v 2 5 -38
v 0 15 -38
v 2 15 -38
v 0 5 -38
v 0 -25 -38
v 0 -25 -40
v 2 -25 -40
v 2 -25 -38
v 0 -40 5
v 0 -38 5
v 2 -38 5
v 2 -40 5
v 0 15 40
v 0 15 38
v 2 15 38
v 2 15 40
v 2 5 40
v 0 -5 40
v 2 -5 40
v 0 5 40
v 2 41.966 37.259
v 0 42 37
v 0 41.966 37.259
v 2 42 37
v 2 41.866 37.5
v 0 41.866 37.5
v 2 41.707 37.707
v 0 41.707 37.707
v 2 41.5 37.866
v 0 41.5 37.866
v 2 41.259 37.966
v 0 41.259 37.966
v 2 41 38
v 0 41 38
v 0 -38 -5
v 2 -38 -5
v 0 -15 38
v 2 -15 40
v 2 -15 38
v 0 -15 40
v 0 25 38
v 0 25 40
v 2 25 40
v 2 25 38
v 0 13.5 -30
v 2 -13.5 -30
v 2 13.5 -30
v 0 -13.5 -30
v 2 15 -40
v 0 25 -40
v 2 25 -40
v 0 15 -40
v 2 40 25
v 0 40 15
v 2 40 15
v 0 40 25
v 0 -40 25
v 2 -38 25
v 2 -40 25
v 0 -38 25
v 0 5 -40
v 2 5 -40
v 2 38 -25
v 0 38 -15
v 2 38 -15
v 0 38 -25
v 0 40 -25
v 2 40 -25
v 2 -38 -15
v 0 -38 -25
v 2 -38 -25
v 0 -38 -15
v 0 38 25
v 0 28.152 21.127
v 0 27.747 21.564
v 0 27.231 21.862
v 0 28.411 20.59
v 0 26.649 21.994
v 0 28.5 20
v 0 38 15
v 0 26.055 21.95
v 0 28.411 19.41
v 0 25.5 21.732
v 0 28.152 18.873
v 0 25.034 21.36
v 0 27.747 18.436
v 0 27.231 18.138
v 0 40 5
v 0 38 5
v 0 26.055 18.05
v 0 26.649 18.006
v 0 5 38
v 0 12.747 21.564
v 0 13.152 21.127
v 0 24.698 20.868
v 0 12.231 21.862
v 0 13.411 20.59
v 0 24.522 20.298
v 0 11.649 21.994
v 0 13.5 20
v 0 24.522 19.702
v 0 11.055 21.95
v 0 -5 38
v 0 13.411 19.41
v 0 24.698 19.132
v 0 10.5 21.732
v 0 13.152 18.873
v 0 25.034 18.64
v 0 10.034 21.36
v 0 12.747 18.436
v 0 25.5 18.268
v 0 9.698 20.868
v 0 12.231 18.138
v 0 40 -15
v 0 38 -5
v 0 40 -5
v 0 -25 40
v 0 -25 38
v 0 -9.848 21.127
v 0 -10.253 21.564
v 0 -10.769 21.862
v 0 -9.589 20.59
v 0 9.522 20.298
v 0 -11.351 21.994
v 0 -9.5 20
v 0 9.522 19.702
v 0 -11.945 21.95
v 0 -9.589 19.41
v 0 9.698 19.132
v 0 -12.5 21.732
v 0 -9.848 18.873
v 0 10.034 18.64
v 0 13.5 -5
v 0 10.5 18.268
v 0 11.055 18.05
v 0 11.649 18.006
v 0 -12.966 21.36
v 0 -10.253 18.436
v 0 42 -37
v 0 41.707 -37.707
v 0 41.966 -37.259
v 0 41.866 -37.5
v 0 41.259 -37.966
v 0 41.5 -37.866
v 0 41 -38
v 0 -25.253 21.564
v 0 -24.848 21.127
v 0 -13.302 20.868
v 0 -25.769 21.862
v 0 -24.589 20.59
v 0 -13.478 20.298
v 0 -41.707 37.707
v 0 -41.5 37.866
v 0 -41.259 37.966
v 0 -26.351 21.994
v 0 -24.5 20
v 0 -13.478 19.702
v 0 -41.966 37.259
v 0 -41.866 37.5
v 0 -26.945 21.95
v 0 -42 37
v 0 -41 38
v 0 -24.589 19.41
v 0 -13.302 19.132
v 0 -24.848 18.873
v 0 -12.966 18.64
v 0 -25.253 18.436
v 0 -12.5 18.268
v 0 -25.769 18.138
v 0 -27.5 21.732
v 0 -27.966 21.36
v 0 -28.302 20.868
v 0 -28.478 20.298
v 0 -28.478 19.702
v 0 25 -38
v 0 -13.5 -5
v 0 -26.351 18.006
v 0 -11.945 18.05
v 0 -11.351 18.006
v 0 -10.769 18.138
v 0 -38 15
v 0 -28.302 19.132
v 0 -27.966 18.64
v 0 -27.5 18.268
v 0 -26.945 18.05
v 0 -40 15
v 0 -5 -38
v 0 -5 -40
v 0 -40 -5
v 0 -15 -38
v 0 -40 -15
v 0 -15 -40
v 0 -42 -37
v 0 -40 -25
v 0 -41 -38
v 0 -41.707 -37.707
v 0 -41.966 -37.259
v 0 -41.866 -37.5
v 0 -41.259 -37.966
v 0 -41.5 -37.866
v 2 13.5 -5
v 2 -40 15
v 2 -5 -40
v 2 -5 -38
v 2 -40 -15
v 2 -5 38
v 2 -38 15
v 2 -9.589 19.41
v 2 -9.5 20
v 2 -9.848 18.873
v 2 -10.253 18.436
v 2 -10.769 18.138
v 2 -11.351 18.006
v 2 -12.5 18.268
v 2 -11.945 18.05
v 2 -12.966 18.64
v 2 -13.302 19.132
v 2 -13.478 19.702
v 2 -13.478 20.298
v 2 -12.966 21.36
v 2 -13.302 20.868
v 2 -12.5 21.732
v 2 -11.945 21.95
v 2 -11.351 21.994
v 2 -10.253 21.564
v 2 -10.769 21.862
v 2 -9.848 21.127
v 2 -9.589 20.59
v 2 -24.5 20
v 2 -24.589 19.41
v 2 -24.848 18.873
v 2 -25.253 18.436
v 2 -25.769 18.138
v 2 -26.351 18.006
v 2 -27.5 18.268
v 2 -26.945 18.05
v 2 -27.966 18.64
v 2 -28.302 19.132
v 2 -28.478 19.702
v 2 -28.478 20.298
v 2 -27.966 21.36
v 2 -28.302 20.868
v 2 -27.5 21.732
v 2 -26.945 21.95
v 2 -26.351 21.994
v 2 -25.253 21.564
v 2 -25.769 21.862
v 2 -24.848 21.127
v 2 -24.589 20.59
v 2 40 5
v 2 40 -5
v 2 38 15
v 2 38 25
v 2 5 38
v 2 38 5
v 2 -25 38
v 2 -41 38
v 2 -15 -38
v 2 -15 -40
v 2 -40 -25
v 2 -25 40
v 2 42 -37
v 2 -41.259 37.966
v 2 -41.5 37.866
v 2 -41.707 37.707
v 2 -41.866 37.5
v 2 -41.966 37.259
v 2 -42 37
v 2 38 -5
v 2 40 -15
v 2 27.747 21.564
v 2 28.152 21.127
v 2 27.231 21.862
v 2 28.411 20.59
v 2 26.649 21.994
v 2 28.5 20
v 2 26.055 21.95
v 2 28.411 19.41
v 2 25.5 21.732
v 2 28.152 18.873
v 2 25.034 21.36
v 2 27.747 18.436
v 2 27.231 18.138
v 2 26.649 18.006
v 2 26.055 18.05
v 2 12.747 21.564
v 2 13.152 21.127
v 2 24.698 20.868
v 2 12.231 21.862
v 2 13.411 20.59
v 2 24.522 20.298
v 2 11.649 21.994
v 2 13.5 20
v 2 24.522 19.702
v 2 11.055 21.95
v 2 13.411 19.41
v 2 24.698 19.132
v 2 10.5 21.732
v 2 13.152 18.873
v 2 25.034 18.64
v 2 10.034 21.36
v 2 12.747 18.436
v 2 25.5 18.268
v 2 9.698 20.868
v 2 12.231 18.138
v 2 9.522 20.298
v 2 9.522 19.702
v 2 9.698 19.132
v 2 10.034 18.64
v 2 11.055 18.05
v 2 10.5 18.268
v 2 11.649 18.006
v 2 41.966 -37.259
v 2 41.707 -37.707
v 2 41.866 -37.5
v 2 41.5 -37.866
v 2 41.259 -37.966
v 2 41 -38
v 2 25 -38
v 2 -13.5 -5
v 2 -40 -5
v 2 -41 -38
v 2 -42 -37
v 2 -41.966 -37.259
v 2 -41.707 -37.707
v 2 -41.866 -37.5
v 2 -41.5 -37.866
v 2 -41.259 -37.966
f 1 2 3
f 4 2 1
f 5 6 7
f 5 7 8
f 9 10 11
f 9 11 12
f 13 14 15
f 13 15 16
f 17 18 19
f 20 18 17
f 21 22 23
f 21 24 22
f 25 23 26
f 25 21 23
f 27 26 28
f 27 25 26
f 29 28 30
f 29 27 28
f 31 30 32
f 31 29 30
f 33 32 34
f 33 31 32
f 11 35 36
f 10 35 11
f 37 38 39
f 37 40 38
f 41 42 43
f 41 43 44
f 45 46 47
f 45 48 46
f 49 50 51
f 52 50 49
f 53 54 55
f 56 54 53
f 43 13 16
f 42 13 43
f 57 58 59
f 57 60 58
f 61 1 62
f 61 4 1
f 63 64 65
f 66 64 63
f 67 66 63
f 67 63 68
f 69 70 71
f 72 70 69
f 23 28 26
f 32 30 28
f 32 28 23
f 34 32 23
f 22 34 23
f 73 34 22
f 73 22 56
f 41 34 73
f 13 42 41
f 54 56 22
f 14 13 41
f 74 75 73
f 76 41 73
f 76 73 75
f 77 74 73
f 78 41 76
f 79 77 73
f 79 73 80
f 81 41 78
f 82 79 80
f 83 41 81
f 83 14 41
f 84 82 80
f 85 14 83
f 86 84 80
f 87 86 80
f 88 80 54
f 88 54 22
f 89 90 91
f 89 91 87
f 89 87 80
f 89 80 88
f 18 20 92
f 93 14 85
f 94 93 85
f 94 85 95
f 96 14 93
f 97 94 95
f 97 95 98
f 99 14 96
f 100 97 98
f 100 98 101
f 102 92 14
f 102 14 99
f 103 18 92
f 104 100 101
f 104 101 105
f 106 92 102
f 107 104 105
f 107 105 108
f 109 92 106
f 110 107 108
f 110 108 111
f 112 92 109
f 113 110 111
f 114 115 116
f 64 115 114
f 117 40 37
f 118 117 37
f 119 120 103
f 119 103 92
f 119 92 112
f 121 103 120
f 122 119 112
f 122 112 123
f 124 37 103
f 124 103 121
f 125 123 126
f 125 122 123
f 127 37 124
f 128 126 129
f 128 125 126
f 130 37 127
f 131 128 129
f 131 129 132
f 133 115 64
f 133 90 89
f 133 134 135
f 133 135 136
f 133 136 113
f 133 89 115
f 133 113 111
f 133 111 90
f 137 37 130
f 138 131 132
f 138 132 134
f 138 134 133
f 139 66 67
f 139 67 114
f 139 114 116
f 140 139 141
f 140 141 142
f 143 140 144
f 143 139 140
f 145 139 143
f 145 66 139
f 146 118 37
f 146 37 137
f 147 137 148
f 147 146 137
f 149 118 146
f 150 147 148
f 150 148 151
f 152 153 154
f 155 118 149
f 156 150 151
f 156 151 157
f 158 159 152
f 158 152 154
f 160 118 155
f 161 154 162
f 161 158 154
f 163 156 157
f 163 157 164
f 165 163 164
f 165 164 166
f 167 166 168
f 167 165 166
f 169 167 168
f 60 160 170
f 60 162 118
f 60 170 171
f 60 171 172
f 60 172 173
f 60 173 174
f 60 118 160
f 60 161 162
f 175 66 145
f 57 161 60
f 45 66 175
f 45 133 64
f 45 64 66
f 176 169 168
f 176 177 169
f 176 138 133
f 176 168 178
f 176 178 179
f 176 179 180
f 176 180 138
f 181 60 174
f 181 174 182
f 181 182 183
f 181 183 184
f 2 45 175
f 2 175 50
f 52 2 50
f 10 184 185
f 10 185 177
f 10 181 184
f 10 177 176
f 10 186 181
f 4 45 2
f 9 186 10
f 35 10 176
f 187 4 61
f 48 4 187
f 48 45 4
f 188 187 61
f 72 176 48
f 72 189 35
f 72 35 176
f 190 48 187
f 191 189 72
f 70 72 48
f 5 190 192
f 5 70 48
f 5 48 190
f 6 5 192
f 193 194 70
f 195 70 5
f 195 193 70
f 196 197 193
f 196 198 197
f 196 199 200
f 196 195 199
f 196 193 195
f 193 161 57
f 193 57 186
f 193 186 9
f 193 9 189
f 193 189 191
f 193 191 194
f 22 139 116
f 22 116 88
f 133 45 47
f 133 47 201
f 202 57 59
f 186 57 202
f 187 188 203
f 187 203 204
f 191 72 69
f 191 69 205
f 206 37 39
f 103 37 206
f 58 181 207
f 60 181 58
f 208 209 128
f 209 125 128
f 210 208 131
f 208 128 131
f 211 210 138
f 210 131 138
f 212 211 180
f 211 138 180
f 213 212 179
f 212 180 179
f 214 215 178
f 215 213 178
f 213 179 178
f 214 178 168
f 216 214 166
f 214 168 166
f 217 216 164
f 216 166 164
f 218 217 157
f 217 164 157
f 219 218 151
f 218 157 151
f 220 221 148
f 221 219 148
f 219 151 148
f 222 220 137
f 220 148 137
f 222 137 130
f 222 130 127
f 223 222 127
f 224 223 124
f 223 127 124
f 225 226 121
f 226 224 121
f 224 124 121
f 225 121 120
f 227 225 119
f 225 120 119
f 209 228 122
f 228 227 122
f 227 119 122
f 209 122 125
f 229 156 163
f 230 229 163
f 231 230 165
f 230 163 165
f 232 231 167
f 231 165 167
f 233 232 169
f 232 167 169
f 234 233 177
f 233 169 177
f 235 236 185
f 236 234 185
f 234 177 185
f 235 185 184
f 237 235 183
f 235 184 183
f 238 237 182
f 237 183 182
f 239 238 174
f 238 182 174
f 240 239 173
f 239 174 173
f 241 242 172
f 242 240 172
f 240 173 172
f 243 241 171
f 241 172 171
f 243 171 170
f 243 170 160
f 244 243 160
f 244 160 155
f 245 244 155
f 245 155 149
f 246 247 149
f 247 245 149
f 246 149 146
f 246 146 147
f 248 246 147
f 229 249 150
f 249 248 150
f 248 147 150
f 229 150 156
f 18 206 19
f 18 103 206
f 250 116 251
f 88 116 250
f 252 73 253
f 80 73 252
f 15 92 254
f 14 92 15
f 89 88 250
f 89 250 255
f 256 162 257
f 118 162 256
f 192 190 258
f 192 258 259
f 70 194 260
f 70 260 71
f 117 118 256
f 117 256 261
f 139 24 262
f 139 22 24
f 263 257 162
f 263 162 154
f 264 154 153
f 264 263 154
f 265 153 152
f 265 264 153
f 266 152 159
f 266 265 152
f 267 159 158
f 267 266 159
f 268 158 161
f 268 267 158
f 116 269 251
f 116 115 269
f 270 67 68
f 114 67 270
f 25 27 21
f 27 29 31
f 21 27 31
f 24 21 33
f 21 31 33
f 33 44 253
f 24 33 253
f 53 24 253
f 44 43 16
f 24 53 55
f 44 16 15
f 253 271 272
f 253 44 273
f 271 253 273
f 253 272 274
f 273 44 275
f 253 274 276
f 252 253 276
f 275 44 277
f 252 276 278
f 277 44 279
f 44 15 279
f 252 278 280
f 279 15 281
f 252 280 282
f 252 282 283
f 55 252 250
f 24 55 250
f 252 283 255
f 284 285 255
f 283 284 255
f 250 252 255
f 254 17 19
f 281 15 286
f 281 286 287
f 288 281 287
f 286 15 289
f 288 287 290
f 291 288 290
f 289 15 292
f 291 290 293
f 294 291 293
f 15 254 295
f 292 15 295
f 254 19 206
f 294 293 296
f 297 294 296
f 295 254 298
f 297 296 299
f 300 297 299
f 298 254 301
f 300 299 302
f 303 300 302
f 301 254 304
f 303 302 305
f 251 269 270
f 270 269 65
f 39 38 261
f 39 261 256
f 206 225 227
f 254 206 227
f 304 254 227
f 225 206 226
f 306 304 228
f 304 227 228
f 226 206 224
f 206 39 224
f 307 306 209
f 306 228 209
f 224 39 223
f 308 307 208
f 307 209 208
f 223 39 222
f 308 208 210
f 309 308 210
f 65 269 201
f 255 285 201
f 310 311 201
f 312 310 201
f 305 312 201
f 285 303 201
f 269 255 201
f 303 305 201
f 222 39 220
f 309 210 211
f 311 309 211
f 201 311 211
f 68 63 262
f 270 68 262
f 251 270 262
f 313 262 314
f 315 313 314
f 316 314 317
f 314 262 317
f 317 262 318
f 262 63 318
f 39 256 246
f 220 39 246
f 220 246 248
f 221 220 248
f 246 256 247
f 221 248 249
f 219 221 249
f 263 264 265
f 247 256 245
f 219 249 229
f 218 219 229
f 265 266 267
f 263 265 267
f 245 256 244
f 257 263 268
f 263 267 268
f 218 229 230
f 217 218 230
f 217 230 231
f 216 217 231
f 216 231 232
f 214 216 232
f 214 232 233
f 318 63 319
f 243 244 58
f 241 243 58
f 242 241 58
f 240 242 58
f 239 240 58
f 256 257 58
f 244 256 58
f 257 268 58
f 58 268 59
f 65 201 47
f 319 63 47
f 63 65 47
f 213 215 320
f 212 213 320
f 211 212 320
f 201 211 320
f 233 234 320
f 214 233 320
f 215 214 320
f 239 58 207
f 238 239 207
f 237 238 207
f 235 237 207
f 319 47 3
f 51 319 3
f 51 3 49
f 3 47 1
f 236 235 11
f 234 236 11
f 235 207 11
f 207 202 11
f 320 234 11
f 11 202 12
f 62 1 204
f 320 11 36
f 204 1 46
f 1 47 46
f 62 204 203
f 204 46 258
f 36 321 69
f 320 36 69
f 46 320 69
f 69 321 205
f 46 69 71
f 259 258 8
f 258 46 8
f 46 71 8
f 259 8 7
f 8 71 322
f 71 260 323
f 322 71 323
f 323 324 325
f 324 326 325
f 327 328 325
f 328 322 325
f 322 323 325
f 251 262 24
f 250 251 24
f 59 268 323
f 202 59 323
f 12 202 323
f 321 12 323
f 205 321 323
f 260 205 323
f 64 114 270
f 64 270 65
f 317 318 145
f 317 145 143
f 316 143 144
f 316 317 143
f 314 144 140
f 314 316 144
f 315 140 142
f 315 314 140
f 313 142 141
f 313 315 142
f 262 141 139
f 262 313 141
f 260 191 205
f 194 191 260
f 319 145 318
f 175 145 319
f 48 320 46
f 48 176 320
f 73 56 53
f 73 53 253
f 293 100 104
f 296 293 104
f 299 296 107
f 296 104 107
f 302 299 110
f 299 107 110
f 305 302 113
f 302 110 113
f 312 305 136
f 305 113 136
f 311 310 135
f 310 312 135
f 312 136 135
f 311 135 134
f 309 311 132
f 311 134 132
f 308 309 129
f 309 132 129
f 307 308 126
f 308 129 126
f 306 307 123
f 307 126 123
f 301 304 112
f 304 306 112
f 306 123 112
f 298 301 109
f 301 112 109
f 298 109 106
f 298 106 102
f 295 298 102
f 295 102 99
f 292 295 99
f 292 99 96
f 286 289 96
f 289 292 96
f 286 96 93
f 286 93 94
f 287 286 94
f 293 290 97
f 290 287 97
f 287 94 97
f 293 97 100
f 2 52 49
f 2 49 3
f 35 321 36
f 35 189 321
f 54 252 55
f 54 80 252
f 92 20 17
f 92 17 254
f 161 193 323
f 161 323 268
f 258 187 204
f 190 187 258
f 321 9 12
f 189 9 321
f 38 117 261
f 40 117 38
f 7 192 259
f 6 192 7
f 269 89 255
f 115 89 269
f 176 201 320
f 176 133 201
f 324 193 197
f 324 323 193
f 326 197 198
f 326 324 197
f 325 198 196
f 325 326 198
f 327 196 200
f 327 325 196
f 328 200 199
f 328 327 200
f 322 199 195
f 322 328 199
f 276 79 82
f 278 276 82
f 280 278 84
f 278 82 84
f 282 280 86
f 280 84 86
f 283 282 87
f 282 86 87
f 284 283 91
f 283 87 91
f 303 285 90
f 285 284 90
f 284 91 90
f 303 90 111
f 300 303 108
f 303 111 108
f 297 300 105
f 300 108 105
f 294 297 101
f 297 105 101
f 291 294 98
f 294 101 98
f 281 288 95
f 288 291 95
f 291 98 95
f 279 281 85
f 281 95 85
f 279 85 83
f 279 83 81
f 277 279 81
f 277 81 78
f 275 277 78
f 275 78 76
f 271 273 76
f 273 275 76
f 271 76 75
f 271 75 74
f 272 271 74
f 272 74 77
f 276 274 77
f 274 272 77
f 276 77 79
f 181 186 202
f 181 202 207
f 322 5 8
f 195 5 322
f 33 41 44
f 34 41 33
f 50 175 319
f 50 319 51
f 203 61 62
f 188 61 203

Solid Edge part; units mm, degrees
sketch "Sketch1" plane through (0, 0, 0) normal (1, 0, 0) x (0, 1, 0)
  line L0 (42, 40) -> (42, -40)
  line L1 (42, -40) -> (-42, -40)
  line L2 (-42, -40) -> (-42, 40)
  line L3 (-42, 40) -> (42, 40)
extrude "Protrusion1" add sketch "Sketch1" along normal blind 2
sketch "Sketch2" plane through (0, 0, 0) normal (1, 0, 0) x (0, 1, 0)
  line L0 (-42, 38) -> (-25, 38)
  line L1 (-25, 38) -> (-25, 40)
  line L2 (-25, 40) -> (-42, 40)
  line L3 (-42, 40) -> (-42, 38)
  line L4 (-5, 40) -> (-15, 40)
  line L5 (-15, 40) -> (-15, 38)
  line L6 (-15, 38) -> (-5, 38)
  line L7 (-5, 38) -> (-5, 40)
  line L8 (15, 40) -> (5, 40)
  line L9 (5, 40) -> (5, 38)
  line L10 (5, 38) -> (15, 38)
  line L11 (15, 38) -> (15, 40)
  line L12 (42, 40) -> (25, 40)
  line L13 (25, 40) -> (25, 38)
  line L14 (25, 38) -> (42, 38)
  line L15 (42, 38) -> (42, 40)
  line L16 (38, 25) -> (38, 15)
  line L17 (38, 15) -> (40, 15)
  line L18 (40, 15) -> (40, 25)
  line L19 (40, 25) -> (38, 25)
  line L20 (38, 5) -> (38, -5)
  line L21 (38, -5) -> (40, -5)
  line L22 (40, -5) -> (40, 5)
  line L23 (40, 5) -> (38, 5)
  line L24 (38, -15) -> (38, -25)
  line L25 (38, -25) -> (40, -25)
  line L26 (40, -25) -> (40, -15)
  line L27 (40, -15) -> (38, -15)
  line L28 (42, -38) -> (25, -38)
  line L29 (25, -38) -> (25, -40)
  line L30 (25, -40) -> (42, -40)
  line L31 (42, -40) -> (42, -38)
  line L32 (15, -38) -> (5, -38)
  line L33 (5, -38) -> (5, -40)
  line L34 (5, -40) -> (15, -40)
  line L35 (15, -40) -> (15, -38)
  line L36 (-5, -38) -> (-15, -38)
  line L37 (-15, -38) -> (-15, -40)
  line L38 (-15, -40) -> (-5, -40)
  line L39 (-5, -40) -> (-5, -38)
  line L40 (-25, -38) -> (-42, -38)
  line L41 (-42, -38) -> (-42, -40)
  line L42 (-42, -40) -> (-25, -40)
  line L43 (-25, -40) -> (-25, -38)
  line L44 (-38, -25) -> (-38, -15)
  line L45 (-38, -15) -> (-40, -15)
  line L46 (-40, -15) -> (-40, -25)
  line L47 (-40, -25) -> (-38, -25)
  line L48 (-38, 5) -> (-40, 5)
  line L49 (-40, 5) -> (-40, -5)
  line L50 (-40, -5) -> (-38, -5)
  line L51 (-38, -5) -> (-38, 5)
  line L52 (-40, 15) -> (-38, 15)
  line L53 (-38, 15) -> (-38, 25)
  line L54 (-38, 25) -> (-40, 25)
  line L55 (-40, 25) -> (-40, 15)
  dimension "D1" = 17
  dimension "D2" = 2
  dimension "D3" = 17
  dimension "D4" = 2
  dimension "D5" = 17
  dimension "D6" = 2
  dimension "D7" = 17
  dimension "D8" = 2
  dimension "D9" = 10
  dimension "D10" = 2
  dimension "D11" = 10
  dimension "D12" = 2
  dimension "D13" = 10
  dimension "D14" = 2
  dimension "D15" = 2
  dimension "D16" = 10
  dimension "D17" = 2
  dimension "D18" = 10
  dimension "D19" = 2
  dimension "D20" = 10
  dimension "D21" = 2
  dimension "D22" = 10
  dimension "D23" = 2
  dimension "D24" = 10
  dimension "D25" = 2
  dimension "D26" = 10
  dimension "D27" = 10
  dimension "D28" = 2
  dimension "D29" = 10
  dimension "D30" = 10
  dimension "D31" = 10
  dimension "D32" = 15
  dimension "D33" = 2
  dimension "D34" = 2
  dimension "D35" = 2
  dimension "D36" = 15
  dimension "D37" = 10
  dimension "D38" = 10
  dimension "D39" = 10
  dimension "D40" = 10
  dimension "D41" = 10
  dimension "D42" = 2
  dimension "D43" = 15
  dimension "D44" = 2
  dimension "D45" = 10
  dimension "D46" = 15
  dimension "D47" = 2
  dimension "D48" = 10
extrude "Cutout1" cut sketch "Sketch2" along normal blind 2
sketch "Sketch3" plane through (0, 0, 0) normal (1, 0, 0) x (0, 1, 0)
  circle A0 centre (-26.5, 20) radius 2
  circle A1 centre (-11.5, 20) radius 2
  circle A2 centre (11.5, 20) radius 2
  circle A3 centre (26.5, 20) radius 2
  line L0 (13.5, -5) -> (-13.5, -5)
  line L1 (-13.5, -5) -> (-13.5, -30)
  line L2 (-13.5, -30) -> (13.5, -30)
  line L3 (13.5, -30) -> (13.5, -5)
  dimension "D1" = 4
  dimension "D2" = 4
  dimension "D3" = 4
  dimension "D4" = 4
  dimension "D5" = 15
  dimension "D6" = 11.5
  dimension "D7" = 11.5
  dimension "D8" = 15
  dimension "D9" = 11.5
  dimension "D10" = 20
  dimension "D11" = 27
  dimension "D12" = 25
  dimension "D13" = 5
  dimension "D14" = 8
extrude "ExtrudedCutout_13" cut sketch "Sketch3" along normal blind 2
fillet "Round_1" radius 1 4 edges at (1, -42, -38) (1, 42, -38) (1, 42, 38) (1, -42, 38)
properties material "Acrylic, high impact grade"
